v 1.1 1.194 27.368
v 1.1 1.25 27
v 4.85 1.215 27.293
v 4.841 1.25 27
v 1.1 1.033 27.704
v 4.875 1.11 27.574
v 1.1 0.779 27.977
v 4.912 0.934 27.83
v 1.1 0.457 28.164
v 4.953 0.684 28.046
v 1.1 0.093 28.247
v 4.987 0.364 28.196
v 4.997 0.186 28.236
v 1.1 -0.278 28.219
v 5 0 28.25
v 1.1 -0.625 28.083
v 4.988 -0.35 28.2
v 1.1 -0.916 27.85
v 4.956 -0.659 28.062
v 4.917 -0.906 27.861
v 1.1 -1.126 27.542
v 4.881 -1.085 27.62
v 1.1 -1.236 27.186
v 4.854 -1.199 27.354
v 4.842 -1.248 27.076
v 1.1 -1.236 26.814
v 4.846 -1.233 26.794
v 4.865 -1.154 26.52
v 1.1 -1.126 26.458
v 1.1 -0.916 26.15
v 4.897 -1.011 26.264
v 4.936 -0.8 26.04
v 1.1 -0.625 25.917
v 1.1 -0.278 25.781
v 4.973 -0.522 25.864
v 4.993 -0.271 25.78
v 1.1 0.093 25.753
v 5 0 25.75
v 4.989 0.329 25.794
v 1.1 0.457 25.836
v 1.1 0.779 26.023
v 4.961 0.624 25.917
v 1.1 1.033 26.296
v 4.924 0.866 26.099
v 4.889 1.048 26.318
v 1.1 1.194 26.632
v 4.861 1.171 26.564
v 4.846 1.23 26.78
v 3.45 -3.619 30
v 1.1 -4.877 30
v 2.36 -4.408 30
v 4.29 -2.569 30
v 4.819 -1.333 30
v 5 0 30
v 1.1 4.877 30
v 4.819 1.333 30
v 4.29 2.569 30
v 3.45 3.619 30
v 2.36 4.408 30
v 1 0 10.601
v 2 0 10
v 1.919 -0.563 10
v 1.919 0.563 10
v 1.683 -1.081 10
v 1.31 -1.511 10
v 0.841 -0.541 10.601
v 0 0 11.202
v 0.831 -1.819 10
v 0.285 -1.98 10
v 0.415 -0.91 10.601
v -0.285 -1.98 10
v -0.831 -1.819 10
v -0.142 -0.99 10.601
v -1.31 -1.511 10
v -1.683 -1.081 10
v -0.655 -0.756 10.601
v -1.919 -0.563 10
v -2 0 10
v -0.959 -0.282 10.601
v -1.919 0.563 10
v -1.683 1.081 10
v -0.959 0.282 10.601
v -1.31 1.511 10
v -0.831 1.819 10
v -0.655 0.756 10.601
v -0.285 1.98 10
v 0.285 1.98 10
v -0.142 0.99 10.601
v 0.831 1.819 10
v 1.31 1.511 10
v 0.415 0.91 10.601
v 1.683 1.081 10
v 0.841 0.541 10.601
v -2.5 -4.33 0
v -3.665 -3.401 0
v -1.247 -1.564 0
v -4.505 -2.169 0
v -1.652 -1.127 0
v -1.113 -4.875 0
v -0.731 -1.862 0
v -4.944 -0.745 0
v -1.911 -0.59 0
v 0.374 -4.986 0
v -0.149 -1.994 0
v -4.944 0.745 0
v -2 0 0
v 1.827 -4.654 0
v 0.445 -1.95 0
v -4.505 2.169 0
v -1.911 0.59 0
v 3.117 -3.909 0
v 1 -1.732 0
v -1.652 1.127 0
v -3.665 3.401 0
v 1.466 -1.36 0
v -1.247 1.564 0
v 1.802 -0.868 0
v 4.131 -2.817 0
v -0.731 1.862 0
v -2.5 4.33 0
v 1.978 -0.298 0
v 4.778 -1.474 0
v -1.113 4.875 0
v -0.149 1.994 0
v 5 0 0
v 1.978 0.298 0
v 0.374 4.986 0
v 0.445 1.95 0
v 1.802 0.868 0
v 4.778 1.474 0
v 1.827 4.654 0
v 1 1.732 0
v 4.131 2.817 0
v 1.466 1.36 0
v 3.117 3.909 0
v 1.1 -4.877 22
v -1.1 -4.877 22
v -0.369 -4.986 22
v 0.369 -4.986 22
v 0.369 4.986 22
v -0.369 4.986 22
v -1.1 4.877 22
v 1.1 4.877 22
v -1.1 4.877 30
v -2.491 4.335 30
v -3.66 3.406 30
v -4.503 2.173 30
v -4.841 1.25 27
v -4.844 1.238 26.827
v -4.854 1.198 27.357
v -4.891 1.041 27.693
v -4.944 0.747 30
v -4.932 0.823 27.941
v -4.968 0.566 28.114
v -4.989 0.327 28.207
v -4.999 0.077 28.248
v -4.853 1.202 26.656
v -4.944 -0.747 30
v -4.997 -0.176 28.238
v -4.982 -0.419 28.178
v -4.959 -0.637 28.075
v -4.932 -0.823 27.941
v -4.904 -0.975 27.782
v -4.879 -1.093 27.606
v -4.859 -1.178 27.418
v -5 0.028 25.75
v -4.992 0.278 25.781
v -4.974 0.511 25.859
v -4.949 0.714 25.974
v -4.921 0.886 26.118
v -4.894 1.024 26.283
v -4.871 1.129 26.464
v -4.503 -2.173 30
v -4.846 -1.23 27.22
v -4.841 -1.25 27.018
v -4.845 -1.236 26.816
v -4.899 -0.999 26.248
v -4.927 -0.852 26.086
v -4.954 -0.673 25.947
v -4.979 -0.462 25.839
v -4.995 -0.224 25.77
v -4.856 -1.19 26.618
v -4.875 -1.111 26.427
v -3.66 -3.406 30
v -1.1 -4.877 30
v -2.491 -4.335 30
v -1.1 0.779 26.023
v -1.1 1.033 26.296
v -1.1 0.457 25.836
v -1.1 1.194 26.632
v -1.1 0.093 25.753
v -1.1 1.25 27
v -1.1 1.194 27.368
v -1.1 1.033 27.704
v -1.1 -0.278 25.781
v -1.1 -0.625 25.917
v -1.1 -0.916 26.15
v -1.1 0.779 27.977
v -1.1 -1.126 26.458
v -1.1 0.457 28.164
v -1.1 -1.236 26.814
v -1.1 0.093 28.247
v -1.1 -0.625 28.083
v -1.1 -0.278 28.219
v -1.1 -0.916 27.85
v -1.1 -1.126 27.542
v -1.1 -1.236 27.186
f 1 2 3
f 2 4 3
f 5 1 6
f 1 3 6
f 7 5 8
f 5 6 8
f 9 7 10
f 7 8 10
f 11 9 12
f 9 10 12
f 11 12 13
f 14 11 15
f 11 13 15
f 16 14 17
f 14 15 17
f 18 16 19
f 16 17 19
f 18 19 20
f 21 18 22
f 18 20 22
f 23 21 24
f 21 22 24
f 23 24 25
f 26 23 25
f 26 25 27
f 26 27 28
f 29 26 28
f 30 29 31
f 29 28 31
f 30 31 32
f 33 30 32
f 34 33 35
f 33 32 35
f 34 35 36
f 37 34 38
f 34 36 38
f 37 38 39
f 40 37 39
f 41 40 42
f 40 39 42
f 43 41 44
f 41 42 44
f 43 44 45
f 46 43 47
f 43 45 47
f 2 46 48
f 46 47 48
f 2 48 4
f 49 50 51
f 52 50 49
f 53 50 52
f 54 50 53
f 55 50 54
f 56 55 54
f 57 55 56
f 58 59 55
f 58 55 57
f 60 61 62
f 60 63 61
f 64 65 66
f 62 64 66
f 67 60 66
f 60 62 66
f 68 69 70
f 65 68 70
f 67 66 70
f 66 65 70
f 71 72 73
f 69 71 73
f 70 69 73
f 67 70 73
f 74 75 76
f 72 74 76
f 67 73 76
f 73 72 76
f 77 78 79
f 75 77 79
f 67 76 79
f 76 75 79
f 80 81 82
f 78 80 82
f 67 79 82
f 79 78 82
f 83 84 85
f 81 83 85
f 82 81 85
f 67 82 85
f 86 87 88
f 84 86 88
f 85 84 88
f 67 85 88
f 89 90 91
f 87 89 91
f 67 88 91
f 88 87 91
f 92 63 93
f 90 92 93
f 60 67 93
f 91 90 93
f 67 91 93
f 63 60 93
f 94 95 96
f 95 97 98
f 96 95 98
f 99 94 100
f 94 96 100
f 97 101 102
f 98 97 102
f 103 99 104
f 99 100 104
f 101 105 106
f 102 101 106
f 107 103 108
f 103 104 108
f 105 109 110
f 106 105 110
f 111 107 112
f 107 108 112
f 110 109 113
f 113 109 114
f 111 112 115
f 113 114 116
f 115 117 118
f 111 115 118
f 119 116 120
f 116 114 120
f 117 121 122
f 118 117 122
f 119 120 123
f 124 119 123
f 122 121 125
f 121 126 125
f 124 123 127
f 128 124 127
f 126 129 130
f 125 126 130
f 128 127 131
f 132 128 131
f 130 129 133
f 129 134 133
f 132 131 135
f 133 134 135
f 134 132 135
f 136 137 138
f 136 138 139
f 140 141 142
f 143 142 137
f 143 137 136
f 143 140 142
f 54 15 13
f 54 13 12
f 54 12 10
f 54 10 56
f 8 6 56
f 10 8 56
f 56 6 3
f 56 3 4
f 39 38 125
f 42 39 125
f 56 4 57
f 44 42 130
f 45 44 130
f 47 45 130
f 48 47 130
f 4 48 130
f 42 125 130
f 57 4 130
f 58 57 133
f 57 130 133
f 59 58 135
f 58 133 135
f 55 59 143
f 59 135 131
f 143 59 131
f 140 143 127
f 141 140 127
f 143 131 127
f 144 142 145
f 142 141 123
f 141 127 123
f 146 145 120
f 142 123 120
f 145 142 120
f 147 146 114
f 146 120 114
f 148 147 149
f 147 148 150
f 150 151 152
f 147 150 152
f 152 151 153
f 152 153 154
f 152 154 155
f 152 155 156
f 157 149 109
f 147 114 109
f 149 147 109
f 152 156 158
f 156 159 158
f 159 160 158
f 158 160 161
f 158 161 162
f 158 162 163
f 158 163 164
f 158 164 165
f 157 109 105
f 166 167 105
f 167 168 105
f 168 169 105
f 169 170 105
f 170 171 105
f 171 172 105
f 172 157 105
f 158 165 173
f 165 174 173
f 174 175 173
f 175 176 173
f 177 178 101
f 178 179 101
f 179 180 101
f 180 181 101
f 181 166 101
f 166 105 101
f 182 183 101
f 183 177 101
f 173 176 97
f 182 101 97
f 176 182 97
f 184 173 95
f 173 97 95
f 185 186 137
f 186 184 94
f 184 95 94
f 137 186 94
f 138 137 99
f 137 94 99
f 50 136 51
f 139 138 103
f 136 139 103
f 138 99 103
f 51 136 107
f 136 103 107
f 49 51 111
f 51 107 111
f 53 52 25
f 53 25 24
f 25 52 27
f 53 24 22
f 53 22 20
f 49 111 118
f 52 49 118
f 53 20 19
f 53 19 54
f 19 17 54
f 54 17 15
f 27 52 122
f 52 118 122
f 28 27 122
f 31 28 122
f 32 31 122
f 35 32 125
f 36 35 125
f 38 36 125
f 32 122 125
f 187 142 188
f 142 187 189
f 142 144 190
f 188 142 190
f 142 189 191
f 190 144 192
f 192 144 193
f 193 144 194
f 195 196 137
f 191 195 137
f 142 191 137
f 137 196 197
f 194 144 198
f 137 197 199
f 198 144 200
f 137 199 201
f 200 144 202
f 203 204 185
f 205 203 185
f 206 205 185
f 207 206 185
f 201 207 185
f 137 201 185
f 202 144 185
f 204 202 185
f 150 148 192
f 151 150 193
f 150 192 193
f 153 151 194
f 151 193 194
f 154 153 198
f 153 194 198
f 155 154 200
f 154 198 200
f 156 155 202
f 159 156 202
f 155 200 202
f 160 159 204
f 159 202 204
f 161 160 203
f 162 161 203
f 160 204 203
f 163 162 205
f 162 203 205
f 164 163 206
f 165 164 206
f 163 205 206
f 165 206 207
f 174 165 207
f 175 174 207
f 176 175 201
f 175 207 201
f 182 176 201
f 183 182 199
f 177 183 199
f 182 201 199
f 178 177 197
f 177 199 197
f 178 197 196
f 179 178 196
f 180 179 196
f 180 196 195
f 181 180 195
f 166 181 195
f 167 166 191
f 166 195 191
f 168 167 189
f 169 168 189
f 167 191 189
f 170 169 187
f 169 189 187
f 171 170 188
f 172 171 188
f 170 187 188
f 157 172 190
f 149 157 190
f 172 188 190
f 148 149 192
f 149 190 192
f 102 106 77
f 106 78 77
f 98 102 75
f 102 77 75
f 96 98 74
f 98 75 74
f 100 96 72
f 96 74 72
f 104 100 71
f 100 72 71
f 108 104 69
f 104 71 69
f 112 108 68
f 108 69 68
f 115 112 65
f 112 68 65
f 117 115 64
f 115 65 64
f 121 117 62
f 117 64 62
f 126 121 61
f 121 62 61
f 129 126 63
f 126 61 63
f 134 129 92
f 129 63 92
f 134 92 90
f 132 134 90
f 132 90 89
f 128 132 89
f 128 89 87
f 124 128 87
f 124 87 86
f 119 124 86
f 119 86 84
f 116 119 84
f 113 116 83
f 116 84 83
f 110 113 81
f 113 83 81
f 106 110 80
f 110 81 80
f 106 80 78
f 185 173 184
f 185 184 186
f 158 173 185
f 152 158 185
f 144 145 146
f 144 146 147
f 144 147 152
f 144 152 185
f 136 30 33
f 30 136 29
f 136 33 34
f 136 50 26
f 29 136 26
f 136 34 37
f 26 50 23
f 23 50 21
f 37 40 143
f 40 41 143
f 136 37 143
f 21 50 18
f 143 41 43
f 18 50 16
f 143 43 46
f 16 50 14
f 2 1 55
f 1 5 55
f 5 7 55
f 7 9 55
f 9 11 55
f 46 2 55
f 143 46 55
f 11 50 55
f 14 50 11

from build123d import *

# Parameters (mm, degrees)
F0_R     = 5
F1_DEPTH = 30
F3_DEPTH = 8
F4_R     = 1.25
F5_DEPTH = 5
F7_D     = 4
F7_DEPTH = 10
F7_TIP   = 1.2017212381


with BuildPart() as f1:
    # F0 (on Top) → F1 (new body)
    with BuildSketch(Plane.XY):
        Circle(F0_R)
    extrude(amount=F1_DEPTH)

    # F2 (on face) → F3 (cut)
    with BuildSketch(Plane.XY.offset(30)):
        with BuildLine():
            ThreePointArc((1.1, 4.8774993593), (0, 5), (-1.1, 4.8774993593))
            Line((-1.1, 4.8774993593), (-1.1, -4.8774993593))
            ThreePointArc((-1.1, -4.8774993593), (0, -5), (1.1, -4.8774993593))
            Line((1.1, -4.8774993593), (1.1, 4.8774993593))
        make_face()
    extrude(amount=-F3_DEPTH, mode=Mode.SUBTRACT)

    # F4 (on Right) → F5 (cut, symmetric)
    with BuildSketch(Plane.YZ):
        with Locations((0, 27)):
            Circle(F4_R)
    extrude(amount=F5_DEPTH, both=True, mode=Mode.SUBTRACT)

    # F7
    with Locations(Plane(origin=(0, 0, 0), x_dir=(1, 0, 0), z_dir=(0, 0, -1))):
        with Locations((0, 0)):
            Hole(F7_D / 2, depth=F7_DEPTH)
            with Locations((0, 0, -(F7_DEPTH + F7_TIP / 2))):  # 118° drill point
                Cone(0, F7_D / 2, F7_TIP, mode=Mode.SUBTRACT)


solid = f1.part
